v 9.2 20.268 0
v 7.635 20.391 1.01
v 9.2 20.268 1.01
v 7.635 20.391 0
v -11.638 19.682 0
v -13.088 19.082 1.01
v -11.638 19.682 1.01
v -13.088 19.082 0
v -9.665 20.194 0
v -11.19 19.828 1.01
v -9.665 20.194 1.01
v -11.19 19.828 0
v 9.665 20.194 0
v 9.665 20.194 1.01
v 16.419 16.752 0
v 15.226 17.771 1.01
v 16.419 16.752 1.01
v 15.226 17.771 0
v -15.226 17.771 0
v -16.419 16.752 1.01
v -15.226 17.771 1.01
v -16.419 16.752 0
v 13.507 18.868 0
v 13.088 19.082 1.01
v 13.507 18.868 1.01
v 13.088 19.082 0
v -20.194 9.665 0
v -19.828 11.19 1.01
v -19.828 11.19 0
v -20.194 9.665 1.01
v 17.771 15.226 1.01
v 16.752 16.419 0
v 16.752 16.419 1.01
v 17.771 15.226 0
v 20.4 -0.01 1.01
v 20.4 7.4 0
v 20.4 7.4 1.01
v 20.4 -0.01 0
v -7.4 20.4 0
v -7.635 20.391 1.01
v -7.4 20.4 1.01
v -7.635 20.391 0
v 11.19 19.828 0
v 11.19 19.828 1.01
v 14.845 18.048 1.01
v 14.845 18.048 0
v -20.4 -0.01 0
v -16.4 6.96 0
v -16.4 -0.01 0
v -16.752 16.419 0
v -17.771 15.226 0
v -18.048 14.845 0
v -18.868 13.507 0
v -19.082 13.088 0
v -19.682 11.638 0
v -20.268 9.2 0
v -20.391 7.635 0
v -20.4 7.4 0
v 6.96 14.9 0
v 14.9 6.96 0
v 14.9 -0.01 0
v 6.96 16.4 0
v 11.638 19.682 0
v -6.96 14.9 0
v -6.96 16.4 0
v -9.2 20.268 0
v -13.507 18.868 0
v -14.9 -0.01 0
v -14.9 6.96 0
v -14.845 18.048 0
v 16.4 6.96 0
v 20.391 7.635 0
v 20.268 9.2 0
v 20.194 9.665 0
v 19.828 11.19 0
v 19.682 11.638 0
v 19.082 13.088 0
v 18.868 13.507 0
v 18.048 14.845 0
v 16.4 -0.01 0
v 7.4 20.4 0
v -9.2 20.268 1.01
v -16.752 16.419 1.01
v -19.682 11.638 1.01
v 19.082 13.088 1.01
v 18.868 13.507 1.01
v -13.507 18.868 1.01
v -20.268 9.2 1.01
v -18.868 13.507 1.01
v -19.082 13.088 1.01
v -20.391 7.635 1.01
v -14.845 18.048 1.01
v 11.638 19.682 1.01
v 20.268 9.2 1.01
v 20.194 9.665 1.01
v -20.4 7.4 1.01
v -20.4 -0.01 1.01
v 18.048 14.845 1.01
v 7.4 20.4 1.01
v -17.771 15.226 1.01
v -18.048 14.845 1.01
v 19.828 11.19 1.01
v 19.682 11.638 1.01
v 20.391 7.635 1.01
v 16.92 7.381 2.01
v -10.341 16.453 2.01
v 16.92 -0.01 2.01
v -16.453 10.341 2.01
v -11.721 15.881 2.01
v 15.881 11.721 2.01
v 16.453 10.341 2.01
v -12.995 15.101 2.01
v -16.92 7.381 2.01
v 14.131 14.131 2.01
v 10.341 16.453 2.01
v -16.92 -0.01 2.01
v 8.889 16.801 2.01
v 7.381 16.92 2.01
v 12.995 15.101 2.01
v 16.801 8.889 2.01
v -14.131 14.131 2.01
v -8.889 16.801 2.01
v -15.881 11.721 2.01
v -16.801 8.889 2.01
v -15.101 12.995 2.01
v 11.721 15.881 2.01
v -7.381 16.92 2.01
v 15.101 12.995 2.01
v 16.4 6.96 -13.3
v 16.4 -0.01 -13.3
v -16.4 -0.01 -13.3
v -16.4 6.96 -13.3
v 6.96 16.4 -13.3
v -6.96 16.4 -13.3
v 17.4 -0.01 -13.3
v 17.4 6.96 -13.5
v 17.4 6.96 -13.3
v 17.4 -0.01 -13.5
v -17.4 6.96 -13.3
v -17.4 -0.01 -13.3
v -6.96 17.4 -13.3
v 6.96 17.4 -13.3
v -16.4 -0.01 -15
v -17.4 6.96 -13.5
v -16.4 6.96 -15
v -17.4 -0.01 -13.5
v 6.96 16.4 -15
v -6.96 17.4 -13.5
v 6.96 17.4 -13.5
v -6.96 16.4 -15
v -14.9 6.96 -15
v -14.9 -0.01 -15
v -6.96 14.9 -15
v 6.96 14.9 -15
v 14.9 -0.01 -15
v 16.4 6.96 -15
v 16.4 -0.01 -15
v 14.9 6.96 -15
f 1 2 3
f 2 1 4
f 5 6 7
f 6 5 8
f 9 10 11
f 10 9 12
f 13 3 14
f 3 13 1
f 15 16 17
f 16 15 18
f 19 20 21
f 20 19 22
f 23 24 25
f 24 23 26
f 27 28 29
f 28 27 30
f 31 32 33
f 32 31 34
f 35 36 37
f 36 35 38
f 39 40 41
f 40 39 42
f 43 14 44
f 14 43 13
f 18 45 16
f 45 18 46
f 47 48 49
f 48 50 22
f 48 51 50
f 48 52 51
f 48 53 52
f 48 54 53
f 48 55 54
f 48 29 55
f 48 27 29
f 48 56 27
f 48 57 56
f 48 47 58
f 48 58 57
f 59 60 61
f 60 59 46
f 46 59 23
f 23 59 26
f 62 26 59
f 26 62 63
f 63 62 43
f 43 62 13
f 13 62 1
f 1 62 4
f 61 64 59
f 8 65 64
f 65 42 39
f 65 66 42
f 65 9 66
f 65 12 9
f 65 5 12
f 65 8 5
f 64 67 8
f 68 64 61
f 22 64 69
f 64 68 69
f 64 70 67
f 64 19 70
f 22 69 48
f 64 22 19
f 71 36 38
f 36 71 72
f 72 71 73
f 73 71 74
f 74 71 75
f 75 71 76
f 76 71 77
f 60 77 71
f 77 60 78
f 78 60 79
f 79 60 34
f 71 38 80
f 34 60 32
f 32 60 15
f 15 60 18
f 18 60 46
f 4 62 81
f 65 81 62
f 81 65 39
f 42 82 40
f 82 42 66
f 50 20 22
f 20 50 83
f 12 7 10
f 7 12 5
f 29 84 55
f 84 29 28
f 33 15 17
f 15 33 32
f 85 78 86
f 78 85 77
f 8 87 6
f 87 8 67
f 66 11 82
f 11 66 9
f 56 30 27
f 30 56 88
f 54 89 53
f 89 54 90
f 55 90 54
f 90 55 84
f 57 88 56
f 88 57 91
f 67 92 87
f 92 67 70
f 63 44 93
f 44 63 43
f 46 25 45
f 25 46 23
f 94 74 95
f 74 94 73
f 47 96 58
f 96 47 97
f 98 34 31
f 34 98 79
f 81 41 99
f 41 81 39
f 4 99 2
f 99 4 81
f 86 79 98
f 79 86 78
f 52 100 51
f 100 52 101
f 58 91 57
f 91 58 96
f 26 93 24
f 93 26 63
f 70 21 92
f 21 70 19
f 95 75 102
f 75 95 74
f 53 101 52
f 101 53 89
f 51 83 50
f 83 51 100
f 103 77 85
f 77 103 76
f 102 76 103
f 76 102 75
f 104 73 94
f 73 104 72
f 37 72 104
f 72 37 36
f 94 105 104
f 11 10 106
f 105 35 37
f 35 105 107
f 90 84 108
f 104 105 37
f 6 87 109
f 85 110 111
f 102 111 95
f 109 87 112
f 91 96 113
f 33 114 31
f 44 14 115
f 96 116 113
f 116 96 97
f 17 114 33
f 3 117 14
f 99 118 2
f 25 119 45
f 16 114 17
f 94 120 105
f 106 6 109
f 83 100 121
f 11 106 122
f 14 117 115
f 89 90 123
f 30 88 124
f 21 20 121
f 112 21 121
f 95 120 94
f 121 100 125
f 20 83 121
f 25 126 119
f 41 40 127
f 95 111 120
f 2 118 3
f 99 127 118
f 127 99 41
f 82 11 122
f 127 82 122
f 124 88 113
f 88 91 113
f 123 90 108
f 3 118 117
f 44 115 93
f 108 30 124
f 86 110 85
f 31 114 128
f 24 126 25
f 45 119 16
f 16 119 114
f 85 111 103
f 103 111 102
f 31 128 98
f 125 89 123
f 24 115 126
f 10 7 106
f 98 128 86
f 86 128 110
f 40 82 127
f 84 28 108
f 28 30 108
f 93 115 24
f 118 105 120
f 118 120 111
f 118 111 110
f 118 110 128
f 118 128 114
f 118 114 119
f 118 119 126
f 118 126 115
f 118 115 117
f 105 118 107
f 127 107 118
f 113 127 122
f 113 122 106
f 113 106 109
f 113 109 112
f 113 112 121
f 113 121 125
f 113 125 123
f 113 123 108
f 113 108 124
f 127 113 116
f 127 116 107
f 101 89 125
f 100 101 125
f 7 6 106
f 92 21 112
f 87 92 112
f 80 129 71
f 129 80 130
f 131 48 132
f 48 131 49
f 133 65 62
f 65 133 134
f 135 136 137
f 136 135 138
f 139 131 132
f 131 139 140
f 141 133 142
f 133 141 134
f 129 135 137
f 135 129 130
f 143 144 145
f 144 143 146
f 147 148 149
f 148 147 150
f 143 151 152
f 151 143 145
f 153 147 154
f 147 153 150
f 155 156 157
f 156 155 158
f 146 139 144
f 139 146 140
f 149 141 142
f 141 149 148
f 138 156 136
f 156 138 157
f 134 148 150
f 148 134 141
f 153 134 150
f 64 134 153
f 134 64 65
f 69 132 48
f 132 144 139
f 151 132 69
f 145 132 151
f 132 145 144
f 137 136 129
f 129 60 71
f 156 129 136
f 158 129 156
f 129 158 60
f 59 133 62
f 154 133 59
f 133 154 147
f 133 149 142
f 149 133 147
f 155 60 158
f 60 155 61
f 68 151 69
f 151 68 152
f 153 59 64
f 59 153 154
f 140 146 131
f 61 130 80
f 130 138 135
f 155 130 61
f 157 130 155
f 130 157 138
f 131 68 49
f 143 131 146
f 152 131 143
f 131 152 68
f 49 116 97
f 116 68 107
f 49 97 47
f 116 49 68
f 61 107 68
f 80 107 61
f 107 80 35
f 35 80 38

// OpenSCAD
/*----------------------------------------------------------------------------*/
/* Cap Generator
/* by Ziv Botzer
/*----------------------------------------------------------------------------*/

// Turn on for validation during preview, TURN OFF FOR PRODUCTION
show_slice = "On"; // [On, Off]

// Hole shape
hole_shape = "Square"; // [Round, Square, Rectangle]

// HOLE Dimension 1 (if circular = diameter)
hole_dimension1 = 34.8; // [10:0.1:150]

// HOLE Dimension 2 (only for rectangle shape)
hole_dimension2 = 50; // [10:0.1:150]

// HOLE Corner Radius (for square/rectangle shapes)
hole_radius = 10; // [0:0.1:20]

// HOLE Depth (e.g. for a table, thickness of the board)
hole_depth = 20; // [2:0.1:100]


// PLUG: plug length
plug_length = 15; // [2:0.1:100]

// PLUG: plug clearance inside hole
plug_clearance = 1; // [0:0.1:5]

// PLUG: plug material thickness
plug_thickness = 1.5; // [0.5:0.1:5]

// PLUG: Choose if you like snaps or fins
features = "Snaps"; // [Snaps, Fins, None]

// PLUG: Snaps/Fins protrusion of teeth (mm)
feature_length = 1.0; // [0.1:0.1:6]

// PLUG: Snaps/Fins height of teeth (mm)
feature_height = 1.5; // [0.1:0.1:6]

// PLUG FINS: Number of fins
fin_number = 3; // [1:1:6]

// PLUG SNAPS: Determines gaps size between snaps
snap_width_factor = 0.5; // [0.1:0.1:1]


// COVER: thickness (mm)
cover_thickness = 2; // [0.5:0.1:15]

// COVER: Overlap around hole
cover_offset = 3; // [0:0.1:30]

// COVER: Edge design
cover_edge = "Chamfer"; // [Chamfer, Round]

// COVER: Edge design ratio 1 (relative size of chamfer/fillet)
cover_edge_ratioV = 0.5; // [0:0.1:1]

// COVER: Edge design ratio 2 (relative size of chamfer/fillet)
cover_edge_ratioH = 0.1; // [0:0.1:1]

// QUALITY: number of polygon facets
$fn = 40;

// QUALITY: steps in fillet cover design 
fillet_steps = 6; // [4:1:15]


/* [Hidden] */
clearance = 0.01;
show_slice_ = (show_slice=="On");
snaps = features == "Snaps";
fins = features == "Fins";

/* testing area
hole_shape = "Rectangle"; // [Round, Square, Rectangle]
snap_width_factor = .5; // [0.1:0.1:1]
show_slice = "Off"; // [On, Off]
features = "Fins"; // [Snaps, Fins, None]
fin_number = 3; // [1:1:6]
hole_radius = 1; // [0:0.1:20]
*/

/*****************************************/
// Show hole

larger_dim = ((hole_shape=="Rectangle")?max(hole_dimension1, hole_dimension2) : hole_dimension1) + cover_offset;
smaller_dim = (hole_shape=="Rectangle")?min(hole_dimension1, hole_dimension2) : hole_dimension1;
largest_depth = max(hole_depth, plug_length)+cover_thickness+1;

// can't have corner radius exceed half the facet length
hole_radius_safe = (hole_radius > smaller_dim/2) ? (smaller_dim/2 - clearance) : hole_radius;

// Illustrate the piece needing a cover
if (show_slice_)
%difference() {
    translate([0,0,-hole_depth/2])
    cube([larger_dim*1.5,larger_dim*1.5,hole_depth],center=true);
    
    translate([0,0,-(hole_depth+clearance)])
    linear_extrude(hole_depth+4*clearance)
    gen_hole_shape(hole_dimension1, hole_dimension2, hole_radius_safe);

    if (show_slice_)
        translate([0,-larger_dim/2, -(largest_depth/2-clearance)])
        cube([larger_dim*2.2, larger_dim*1, largest_depth+clearance*4], center=true);
}

// Generate the cap
difference() {
    generate_cap();
    
    color("Red")
    if (show_slice_)
        translate([0,-larger_dim/2-0.01, -(largest_depth/2)])
        cube([larger_dim*1.8, larger_dim*1, largest_depth*2], center=true);
}




//********************** FUNCTIONS *****************************

module generate_cap () {
    
    union() {
        // Generate cover with corner design
        if (cover_edge == "Chamfer") {
            linear_extrude((1-cover_edge_ratioV)*cover_thickness + clearance, convexity = 4)
            offset(r=cover_offset)
                gen_hole_shape(hole_dimension1, hole_dimension2, hole_radius_safe);
            
            hull() {
                translate([0,0,(1-cover_edge_ratioV)*cover_thickness])
                for (i = [0,1]) {
                    translate([0,0,i*cover_edge_ratioV*cover_thickness])
                    linear_extrude(0.01)
                    offset(r=cover_offset-i*cover_edge_ratioH*smaller_dim)
                    gen_hole_shape(hole_dimension1, hole_dimension2, hole_radius_safe);
                }
            }
            
         
        }
        else if (cover_edge == "Round") {
            linear_extrude((1-cover_edge_ratioV)*cover_thickness + clearance, convexity = 4)
            offset(r=cover_offset)
                gen_hole_shape(hole_dimension1, hole_dimension2, hole_radius_safe);
            
            hull() {
                translate([0,0,(1-cover_edge_ratioV)*cover_thickness])
                for (i = [0:1/fillet_steps:1]) {
                    translate([0,0, sin(i*90)*cover_edge_ratioV*cover_thickness])
                    linear_extrude(0.01)
                    offset(r=cover_offset - (1-cos(i*90))*cover_edge_ratioH*smaller_dim)
                    gen_hole_shape(hole_dimension1, hole_dimension2, hole_radius_safe);
                }
            }
        }
        
        // Generate plug
        difference() {
            
            union() {
                translate([0,0,-(plug_length) + clearance])
                linear_extrude(plug_length+clearance, convexity = 4)
                offset(r=-plug_clearance)
                gen_hole_shape(hole_dimension1, hole_dimension2, hole_radius_safe);

                
                // Generate plug fins
                //translate([0,0,-(hole_depth) + clearance])
                if (fins) {
                    d = plug_length/(fin_number+1);
                    for (i = [1:fin_number]) {
                        translate([0,0,-(d*i + 0.3*d)])
                        hull() {
                            linear_extrude(0.01)
                            offset(r=-plug_clearance)
                            gen_hole_shape(hole_dimension1, hole_dimension2, hole_radius_safe);
                            
                            translate([0,0,feature_height])
                            linear_extrude(0.2)
                            offset(r=feature_length-plug_clearance)
                            gen_hole_shape(hole_dimension1, hole_dimension2, hole_radius_safe);
                        }
                    }
                }
                
                if (snaps) {
                    translate([0,0,-plug_length])
                    hull() {
                        linear_extrude(0.01)
                        offset(r=-plug_clearance)
                        gen_hole_shape(hole_dimension1, hole_dimension2, hole_radius_safe);
                        
                        translate([0,0,feature_height])
                        linear_extrude(0.2)
                        offset(r=feature_length-plug_clearance)
                        gen_hole_shape(hole_dimension1, hole_dimension2, hole_radius_safe);
                    }

                }
            }
            
            // remove inner volume of plug
            translate([0,0,-(plug_length) - clearance])
            linear_extrude(plug_length+2*clearance, convexity = 4)
            offset(r=-(plug_clearance+plug_thickness))
            gen_hole_shape(hole_dimension1, hole_dimension2, hole_radius_safe);
            
            // remove edge chamfer
            if (!snaps)
            translate([0,0,-(plug_length) ])
            difference() {
                linear_extrude(plug_thickness/2 + clearance )
                offset(r=-plug_clearance  + clearance)
                gen_hole_shape(hole_dimension1, hole_dimension2, hole_radius_safe);
            
                hull() {
                    linear_extrude(0.01)
                    offset(r=-plug_clearance -(plug_thickness/2)  + 2*clearance)
                    gen_hole_shape(hole_dimension1, hole_dimension2, hole_radius_safe);
                    
                    translate([0,0,plug_thickness/2 + 2*clearance ])
                    linear_extrude(0.01)
                    offset(r=-plug_clearance)
                    gen_hole_shape(hole_dimension1, hole_dimension2, hole_radius_safe);
                }
            }
            
            // remove snap gaps
            if (snaps) {
                if (hole_shape == "Square") {
                    factor = 0.5+snap_width_factor*0.4;
                    rotate([0,0,45])
                    for (i = [1:4]) {
                        rotate([0,0,i*360/4])
                        translate([factor*hole_dimension1/sin(45),0,-(plug_length/2 + clearance)])
                        rotate([0,0,45])
                        cube([hole_dimension1,hole_dimension1,plug_length+4*clearance], center=true);
                    }
                    
                } 
                else if (hole_shape == "Round") {
                    factor = 0.48+snap_width_factor*0.3;
                    rotate([0,0,45])
                    for (i = [1:4]) {
                        rotate([0,0,i*360/4])
                        translate([factor*hole_dimension1/sin(45),0,-(plug_length/2 + clearance)])
                        rotate([0,0,45])
                        cube([hole_dimension1,hole_dimension1,plug_length+4*clearance], center=true);
                    }
                }
                else { // Rectangle
                    factor = 0.5+0.4*snap_width_factor;
                    
                    translate([-factor*hole_dimension1,factor*hole_dimension2,-(plug_length/2 + clearance)])
                    cube([hole_dimension1,hole_dimension2,plug_length+4*clearance], center=true);
                    
                    translate([factor*hole_dimension1,factor*hole_dimension2,-(plug_length/2 + clearance)])
                    cube([hole_dimension1,hole_dimension2,plug_length+4*clearance], center=true);
                    
                    translate([-factor*hole_dimension1,-factor*hole_dimension2,-(plug_length/2 + clearance)])
                    cube([hole_dimension1,hole_dimension2,plug_length+4*clearance], center=true);
                    
                    translate([factor*hole_dimension1,-factor*hole_dimension2,-(plug_length/2 + clearance)])
                    cube([hole_dimension1,hole_dimension2,plug_length+4*clearance], center=true);
                    
                }
                
            }
            
        }
    }
}

module gen_hole_shape ( d1, d2, r1 ) {
    if (hole_shape == "Round") {
        circle(d=d1);
    }
    else {
        d1b = d1 - 2*r1;
        d2b = ((hole_shape == "Square")?d1:d2) - 2*r1;
        
        translate([-d1b/2,-d2b/2,0]) {
            if (r1 > 0)
                minkowski() {
                    circle(r1);
                    square([d1b,d2b]);
                }
            else {
                square([d1b,d2b]);
            }
        }
    }
}
